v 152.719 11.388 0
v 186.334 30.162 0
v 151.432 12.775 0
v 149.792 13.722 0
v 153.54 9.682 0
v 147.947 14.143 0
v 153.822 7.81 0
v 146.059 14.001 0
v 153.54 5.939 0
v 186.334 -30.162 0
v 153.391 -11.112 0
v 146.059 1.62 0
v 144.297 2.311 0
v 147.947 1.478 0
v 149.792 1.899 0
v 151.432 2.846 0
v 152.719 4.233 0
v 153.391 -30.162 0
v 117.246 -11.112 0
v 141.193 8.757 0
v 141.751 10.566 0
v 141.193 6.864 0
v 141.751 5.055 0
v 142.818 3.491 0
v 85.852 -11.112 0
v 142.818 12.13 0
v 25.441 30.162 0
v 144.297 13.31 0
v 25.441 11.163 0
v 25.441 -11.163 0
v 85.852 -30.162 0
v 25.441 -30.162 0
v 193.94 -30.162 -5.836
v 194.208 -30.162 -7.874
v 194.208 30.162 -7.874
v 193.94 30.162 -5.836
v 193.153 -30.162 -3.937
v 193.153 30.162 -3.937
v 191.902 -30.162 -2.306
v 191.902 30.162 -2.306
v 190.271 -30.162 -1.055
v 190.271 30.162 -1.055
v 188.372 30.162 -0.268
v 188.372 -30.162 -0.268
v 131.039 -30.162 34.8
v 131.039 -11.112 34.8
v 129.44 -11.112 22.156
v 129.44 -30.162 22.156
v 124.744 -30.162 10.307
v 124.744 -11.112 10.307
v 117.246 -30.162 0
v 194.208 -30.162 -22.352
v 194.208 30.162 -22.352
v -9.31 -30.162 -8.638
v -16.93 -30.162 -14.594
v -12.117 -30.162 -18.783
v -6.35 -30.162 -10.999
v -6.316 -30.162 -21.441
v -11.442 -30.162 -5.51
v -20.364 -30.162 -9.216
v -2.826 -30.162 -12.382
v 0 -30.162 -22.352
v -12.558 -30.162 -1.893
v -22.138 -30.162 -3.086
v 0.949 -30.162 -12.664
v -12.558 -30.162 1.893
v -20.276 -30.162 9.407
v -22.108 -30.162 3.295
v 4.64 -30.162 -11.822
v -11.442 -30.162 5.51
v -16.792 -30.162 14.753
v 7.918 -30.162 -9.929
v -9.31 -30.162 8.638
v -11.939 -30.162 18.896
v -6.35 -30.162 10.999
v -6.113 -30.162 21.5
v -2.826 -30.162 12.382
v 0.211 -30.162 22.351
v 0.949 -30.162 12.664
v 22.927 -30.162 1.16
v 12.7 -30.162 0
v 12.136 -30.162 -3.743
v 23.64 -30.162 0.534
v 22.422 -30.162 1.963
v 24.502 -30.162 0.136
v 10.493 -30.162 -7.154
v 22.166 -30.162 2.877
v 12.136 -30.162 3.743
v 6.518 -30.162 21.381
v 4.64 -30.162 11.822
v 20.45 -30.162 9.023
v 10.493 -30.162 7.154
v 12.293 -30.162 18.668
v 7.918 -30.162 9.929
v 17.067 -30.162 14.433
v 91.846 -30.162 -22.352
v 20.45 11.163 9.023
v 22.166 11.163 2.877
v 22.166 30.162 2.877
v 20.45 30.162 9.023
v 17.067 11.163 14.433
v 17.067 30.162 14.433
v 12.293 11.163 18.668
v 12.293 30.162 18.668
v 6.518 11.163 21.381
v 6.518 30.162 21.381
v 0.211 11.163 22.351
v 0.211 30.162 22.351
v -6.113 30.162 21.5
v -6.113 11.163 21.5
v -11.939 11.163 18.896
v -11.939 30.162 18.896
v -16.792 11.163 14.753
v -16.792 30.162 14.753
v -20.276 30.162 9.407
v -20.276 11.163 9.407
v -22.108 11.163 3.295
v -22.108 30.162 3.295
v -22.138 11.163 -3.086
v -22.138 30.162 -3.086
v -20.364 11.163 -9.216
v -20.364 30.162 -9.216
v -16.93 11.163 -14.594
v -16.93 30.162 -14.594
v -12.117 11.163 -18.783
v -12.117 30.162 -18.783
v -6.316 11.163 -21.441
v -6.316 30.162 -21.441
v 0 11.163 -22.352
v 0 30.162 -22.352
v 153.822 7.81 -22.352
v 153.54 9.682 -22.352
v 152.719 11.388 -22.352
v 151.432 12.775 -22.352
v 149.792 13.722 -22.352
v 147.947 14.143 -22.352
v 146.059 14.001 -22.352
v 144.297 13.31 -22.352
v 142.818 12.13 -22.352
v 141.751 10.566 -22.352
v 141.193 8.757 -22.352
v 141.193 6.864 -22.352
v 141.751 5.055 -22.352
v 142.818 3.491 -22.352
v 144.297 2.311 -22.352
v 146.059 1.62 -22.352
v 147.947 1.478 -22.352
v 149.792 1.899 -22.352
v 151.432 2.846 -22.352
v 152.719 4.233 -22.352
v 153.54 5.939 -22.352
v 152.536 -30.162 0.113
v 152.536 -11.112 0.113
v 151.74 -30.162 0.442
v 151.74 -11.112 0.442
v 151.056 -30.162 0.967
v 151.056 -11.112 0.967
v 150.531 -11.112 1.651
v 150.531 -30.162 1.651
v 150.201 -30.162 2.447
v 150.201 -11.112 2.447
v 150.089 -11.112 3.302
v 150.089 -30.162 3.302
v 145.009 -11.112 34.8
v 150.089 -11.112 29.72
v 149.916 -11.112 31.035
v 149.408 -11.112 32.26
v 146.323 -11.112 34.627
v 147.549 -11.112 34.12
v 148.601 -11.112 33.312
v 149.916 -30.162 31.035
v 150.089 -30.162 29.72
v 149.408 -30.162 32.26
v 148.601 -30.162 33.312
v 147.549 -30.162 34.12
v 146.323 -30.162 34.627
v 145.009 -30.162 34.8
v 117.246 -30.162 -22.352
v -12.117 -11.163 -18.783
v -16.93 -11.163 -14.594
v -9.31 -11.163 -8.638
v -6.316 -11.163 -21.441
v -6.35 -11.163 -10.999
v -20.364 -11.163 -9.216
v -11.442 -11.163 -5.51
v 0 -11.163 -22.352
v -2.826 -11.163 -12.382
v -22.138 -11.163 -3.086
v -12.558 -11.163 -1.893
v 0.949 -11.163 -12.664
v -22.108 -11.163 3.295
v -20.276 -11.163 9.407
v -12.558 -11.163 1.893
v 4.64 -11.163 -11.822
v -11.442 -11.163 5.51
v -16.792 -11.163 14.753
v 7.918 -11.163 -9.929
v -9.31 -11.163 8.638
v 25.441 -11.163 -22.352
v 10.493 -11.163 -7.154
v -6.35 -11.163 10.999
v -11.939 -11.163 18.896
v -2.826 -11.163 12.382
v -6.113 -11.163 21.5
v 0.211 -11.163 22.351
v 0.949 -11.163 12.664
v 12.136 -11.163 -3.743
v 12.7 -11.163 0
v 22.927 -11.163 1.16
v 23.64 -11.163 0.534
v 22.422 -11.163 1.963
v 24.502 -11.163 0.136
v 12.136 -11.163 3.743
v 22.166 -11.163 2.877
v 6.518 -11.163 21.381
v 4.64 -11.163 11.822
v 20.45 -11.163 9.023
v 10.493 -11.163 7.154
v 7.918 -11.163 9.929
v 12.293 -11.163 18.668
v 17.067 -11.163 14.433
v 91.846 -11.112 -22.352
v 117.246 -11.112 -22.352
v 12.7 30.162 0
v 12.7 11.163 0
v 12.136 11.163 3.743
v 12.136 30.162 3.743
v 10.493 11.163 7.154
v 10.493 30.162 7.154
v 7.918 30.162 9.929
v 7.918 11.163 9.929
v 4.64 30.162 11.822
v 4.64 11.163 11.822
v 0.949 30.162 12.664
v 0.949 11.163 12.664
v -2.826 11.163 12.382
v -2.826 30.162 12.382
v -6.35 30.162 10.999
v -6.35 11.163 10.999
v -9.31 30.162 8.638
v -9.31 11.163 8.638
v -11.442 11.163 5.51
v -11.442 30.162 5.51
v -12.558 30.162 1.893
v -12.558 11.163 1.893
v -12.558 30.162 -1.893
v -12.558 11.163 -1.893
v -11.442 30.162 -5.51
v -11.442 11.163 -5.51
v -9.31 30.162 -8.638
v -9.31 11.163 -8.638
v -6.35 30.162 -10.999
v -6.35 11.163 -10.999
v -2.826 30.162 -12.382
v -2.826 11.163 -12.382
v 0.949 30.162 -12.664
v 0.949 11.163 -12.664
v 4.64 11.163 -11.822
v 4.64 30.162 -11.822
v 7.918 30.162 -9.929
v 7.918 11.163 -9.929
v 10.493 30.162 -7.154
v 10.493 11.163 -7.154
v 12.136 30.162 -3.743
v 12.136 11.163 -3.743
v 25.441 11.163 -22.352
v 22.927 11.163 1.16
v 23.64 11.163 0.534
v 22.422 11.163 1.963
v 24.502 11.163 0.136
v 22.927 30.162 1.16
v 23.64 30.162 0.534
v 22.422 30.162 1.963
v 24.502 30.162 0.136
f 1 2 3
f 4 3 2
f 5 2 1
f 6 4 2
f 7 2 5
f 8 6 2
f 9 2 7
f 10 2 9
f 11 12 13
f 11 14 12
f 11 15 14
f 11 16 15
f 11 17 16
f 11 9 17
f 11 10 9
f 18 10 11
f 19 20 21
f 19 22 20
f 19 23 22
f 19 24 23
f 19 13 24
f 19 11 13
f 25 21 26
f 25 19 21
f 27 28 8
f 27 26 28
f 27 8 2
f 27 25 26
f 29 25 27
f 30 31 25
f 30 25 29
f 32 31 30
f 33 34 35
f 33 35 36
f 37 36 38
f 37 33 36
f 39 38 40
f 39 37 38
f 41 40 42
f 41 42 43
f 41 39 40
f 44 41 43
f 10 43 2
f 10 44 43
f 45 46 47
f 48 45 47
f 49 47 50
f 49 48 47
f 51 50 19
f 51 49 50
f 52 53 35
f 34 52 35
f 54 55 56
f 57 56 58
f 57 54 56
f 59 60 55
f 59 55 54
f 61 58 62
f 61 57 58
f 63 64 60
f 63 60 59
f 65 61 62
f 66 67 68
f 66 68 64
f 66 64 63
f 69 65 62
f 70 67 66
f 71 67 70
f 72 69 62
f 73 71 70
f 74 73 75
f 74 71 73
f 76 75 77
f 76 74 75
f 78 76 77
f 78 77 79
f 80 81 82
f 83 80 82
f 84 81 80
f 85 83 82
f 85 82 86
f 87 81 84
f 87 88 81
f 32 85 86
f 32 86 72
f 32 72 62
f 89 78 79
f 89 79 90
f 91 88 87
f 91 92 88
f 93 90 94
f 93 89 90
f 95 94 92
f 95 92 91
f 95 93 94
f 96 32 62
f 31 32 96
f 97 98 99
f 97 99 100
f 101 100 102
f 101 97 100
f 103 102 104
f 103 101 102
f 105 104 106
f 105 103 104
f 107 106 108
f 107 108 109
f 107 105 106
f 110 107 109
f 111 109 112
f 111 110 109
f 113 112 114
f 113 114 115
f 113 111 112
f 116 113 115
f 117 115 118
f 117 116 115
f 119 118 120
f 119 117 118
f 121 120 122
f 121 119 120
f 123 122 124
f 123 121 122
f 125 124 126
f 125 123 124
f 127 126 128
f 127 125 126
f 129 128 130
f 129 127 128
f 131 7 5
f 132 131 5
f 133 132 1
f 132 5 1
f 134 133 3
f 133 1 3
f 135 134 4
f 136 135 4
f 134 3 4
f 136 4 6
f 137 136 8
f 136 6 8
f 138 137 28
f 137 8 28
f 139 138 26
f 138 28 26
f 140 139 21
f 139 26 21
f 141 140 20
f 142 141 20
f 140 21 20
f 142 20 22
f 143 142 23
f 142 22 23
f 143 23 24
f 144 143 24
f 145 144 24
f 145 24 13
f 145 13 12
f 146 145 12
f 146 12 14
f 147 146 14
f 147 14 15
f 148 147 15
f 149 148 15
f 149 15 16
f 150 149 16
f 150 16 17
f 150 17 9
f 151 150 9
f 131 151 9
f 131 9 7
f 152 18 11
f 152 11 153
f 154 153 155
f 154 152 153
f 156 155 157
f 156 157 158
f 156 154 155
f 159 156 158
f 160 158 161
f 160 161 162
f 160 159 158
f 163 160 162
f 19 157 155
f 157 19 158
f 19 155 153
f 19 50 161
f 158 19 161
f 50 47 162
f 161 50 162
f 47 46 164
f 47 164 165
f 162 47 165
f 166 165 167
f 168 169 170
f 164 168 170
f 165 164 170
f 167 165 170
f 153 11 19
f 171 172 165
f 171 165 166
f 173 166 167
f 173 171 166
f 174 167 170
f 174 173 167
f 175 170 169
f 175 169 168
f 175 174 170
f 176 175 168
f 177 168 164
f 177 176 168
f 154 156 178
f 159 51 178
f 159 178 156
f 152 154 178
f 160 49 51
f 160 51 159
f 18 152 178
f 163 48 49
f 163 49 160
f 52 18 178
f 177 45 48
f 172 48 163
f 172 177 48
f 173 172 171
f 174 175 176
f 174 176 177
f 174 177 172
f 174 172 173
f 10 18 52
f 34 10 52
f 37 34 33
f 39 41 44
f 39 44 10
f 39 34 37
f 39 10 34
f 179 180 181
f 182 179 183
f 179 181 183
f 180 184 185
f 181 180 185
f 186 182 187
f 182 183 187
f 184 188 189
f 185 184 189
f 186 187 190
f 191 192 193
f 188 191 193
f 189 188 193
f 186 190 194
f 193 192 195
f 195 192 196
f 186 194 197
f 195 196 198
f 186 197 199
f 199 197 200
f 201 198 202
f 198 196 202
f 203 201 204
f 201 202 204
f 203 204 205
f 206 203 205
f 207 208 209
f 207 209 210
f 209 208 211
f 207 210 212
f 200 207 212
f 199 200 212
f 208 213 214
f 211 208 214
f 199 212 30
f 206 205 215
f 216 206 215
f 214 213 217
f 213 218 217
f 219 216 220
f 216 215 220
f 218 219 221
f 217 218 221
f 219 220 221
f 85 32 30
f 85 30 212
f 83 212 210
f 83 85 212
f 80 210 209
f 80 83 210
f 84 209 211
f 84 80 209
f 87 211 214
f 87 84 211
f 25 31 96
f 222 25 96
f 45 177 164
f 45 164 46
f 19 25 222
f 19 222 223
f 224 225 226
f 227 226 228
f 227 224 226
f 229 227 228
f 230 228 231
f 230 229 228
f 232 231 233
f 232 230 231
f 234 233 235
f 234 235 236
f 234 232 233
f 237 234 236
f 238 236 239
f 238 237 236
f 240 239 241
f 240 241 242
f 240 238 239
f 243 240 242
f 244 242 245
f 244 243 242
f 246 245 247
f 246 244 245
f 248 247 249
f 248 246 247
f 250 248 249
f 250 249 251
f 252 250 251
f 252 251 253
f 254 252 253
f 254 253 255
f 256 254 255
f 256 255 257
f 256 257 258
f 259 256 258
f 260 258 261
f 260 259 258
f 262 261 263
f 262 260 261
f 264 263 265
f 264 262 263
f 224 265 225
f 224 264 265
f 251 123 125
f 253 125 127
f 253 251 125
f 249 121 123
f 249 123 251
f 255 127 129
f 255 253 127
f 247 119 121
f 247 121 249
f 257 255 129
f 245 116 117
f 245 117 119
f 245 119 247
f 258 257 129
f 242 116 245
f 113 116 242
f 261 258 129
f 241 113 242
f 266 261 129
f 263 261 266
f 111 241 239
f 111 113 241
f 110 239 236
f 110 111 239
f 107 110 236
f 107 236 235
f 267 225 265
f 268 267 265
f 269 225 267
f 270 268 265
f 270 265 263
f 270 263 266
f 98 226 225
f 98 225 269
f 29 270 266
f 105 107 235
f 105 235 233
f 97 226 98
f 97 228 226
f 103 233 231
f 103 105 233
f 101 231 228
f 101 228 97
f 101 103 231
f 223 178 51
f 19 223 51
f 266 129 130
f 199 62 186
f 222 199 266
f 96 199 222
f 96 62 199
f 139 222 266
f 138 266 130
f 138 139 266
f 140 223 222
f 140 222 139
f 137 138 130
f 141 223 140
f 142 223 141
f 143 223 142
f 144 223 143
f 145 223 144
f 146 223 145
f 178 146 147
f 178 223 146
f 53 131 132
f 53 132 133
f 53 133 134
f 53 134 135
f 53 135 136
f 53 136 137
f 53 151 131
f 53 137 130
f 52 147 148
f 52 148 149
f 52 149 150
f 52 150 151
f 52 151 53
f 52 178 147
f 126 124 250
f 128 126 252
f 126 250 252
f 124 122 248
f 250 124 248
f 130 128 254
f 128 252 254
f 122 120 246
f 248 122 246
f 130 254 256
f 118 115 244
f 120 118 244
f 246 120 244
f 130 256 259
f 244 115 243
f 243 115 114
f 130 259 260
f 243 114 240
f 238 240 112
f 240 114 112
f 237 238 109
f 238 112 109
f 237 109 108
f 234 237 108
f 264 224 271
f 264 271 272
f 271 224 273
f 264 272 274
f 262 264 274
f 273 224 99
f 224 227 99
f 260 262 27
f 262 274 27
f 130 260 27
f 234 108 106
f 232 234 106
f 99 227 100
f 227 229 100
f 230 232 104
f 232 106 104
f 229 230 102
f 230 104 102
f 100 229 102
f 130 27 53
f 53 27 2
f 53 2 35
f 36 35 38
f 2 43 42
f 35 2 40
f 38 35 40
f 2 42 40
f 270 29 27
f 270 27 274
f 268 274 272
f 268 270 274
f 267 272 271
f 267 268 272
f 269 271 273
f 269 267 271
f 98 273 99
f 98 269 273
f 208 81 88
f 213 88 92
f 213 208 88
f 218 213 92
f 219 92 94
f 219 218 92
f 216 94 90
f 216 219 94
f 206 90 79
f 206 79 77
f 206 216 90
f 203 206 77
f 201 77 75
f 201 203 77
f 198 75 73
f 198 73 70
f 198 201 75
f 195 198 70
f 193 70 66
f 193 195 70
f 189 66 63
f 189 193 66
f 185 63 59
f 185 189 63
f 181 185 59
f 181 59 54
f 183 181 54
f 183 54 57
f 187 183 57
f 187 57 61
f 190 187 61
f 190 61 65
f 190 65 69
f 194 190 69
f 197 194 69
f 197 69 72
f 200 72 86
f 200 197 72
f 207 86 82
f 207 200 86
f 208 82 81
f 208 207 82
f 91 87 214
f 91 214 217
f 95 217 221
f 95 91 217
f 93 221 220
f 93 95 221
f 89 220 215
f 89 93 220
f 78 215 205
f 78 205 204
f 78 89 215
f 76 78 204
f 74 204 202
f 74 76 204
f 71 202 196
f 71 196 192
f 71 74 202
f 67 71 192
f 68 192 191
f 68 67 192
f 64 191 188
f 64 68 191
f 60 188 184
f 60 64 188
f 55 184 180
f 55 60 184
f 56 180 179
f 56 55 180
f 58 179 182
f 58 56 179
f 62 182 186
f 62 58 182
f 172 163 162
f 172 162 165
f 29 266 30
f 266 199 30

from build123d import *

# Parameters (mm, degrees)
F0_R     = 12.7
F1_DEPTH = 30.1625
F2_DEPTH = 11.1633
F4_DEPTH = 19.05
F5_DEPTH = 19.05
F6_R     = 6.35
F7_DEPTH = 22.353


with BuildPart() as f1:
    # F0 (on Front) → F1 (new body, symmetric)
    with BuildSketch(Plane.XZ):
        with BuildLine():
            ThreePointArc((25.440608, 0), (23.261179, 0.821417), (22.166074, 2.87699))
            ThreePointArc((22.166074, 2.87699), (-16.791641, 14.753058), (0, -22.352))
            Line((0, -22.352), (25.440608, -22.352))
            Line((25.440608, -22.352), (25.440608, 0))
        make_face()
        Circle(F0_R, mode=Mode.SUBTRACT)
        with BuildLine():
            Line((131.0386, 0), (117.2464, 0))
            Line((117.2464, 0), (117.2464, -22.352))
            Line((117.2464, -22.352), (194.2084, -22.352))
            Line((194.2084, -22.352), (194.2084, -7.874))
            ThreePointArc((194.2084, -7.874), (191.902159, -2.306241), (186.3344, 0))
            Line((186.3344, 0), (153.3906, 0))
            Line((153.3906, 0), (131.0386, 0))
        make_face()
        Polygon((117.2464, 0), (85.852, 0), (91.8464, -22.352), (117.2464, -22.352), align=None)
        Polygon((85.852, 0), (25.440608, 0), (25.440608, -22.352), (91.8464, -22.352), align=None)
    extrude(amount=F1_DEPTH, both=True)

    # F0 (on Front) → F2 (cut, symmetric)
    with BuildSketch(Plane.XZ):
        with BuildLine():
            ThreePointArc((25.440608, 0), (23.261179, 0.821417), (22.166074, 2.87699))
            ThreePointArc((22.166074, 2.87699), (-16.791641, 14.753058), (0, -22.352))
            Line((0, -22.352), (25.440608, -22.352))
            Line((25.440608, -22.352), (25.440608, 0))
        make_face()
        Circle(F0_R, mode=Mode.SUBTRACT)
    extrude(amount=F2_DEPTH, both=True, mode=Mode.SUBTRACT)

    # F3 (on face) → F4 (join)
    with BuildSketch(Plane.XZ.offset(30.1625)):
        Polygon((117.2464, -22.352), (117.2464, 0), (85.852, 0), (91.8464, -22.352), align=None)
        with BuildLine():
            Line((150.0886, 3.302), (150.0886, 29.720327))
            ThreePointArc((150.0886, 29.720327), (148.600702, 33.312429), (145.0086, 34.800327))
            Line((145.0086, 34.800327), (131.0386, 34.800327))
            ThreePointArc((131.0386, 34.800327), (127.464844, 16.083439), (117.2464, 0))
            Line((117.2464, 0), (131.0386, 0))
            Line((131.0386, 0), (153.3906, 0))
            ThreePointArc((153.3906, 0), (151.055733, 0.967133), (150.0886, 3.302))
        make_face()
    extrude(amount=-F4_DEPTH)

    # F3 (on face) → F5 (cut)
    with BuildSketch(Plane.XZ.offset(30.1625)):
        Polygon((117.2464, -22.352), (117.2464, 0), (85.852, 0), (91.8464, -22.352), align=None)
    extrude(amount=-F5_DEPTH, mode=Mode.SUBTRACT)

    # F6 (on face) → F7 (cut, through all)
    with BuildSketch(Plane.XY):
        with Locations((147.4724, 7.8105)):
            Circle(F6_R)
    extrude(amount=-F7_DEPTH, mode=Mode.SUBTRACT)


solid = f1.part
